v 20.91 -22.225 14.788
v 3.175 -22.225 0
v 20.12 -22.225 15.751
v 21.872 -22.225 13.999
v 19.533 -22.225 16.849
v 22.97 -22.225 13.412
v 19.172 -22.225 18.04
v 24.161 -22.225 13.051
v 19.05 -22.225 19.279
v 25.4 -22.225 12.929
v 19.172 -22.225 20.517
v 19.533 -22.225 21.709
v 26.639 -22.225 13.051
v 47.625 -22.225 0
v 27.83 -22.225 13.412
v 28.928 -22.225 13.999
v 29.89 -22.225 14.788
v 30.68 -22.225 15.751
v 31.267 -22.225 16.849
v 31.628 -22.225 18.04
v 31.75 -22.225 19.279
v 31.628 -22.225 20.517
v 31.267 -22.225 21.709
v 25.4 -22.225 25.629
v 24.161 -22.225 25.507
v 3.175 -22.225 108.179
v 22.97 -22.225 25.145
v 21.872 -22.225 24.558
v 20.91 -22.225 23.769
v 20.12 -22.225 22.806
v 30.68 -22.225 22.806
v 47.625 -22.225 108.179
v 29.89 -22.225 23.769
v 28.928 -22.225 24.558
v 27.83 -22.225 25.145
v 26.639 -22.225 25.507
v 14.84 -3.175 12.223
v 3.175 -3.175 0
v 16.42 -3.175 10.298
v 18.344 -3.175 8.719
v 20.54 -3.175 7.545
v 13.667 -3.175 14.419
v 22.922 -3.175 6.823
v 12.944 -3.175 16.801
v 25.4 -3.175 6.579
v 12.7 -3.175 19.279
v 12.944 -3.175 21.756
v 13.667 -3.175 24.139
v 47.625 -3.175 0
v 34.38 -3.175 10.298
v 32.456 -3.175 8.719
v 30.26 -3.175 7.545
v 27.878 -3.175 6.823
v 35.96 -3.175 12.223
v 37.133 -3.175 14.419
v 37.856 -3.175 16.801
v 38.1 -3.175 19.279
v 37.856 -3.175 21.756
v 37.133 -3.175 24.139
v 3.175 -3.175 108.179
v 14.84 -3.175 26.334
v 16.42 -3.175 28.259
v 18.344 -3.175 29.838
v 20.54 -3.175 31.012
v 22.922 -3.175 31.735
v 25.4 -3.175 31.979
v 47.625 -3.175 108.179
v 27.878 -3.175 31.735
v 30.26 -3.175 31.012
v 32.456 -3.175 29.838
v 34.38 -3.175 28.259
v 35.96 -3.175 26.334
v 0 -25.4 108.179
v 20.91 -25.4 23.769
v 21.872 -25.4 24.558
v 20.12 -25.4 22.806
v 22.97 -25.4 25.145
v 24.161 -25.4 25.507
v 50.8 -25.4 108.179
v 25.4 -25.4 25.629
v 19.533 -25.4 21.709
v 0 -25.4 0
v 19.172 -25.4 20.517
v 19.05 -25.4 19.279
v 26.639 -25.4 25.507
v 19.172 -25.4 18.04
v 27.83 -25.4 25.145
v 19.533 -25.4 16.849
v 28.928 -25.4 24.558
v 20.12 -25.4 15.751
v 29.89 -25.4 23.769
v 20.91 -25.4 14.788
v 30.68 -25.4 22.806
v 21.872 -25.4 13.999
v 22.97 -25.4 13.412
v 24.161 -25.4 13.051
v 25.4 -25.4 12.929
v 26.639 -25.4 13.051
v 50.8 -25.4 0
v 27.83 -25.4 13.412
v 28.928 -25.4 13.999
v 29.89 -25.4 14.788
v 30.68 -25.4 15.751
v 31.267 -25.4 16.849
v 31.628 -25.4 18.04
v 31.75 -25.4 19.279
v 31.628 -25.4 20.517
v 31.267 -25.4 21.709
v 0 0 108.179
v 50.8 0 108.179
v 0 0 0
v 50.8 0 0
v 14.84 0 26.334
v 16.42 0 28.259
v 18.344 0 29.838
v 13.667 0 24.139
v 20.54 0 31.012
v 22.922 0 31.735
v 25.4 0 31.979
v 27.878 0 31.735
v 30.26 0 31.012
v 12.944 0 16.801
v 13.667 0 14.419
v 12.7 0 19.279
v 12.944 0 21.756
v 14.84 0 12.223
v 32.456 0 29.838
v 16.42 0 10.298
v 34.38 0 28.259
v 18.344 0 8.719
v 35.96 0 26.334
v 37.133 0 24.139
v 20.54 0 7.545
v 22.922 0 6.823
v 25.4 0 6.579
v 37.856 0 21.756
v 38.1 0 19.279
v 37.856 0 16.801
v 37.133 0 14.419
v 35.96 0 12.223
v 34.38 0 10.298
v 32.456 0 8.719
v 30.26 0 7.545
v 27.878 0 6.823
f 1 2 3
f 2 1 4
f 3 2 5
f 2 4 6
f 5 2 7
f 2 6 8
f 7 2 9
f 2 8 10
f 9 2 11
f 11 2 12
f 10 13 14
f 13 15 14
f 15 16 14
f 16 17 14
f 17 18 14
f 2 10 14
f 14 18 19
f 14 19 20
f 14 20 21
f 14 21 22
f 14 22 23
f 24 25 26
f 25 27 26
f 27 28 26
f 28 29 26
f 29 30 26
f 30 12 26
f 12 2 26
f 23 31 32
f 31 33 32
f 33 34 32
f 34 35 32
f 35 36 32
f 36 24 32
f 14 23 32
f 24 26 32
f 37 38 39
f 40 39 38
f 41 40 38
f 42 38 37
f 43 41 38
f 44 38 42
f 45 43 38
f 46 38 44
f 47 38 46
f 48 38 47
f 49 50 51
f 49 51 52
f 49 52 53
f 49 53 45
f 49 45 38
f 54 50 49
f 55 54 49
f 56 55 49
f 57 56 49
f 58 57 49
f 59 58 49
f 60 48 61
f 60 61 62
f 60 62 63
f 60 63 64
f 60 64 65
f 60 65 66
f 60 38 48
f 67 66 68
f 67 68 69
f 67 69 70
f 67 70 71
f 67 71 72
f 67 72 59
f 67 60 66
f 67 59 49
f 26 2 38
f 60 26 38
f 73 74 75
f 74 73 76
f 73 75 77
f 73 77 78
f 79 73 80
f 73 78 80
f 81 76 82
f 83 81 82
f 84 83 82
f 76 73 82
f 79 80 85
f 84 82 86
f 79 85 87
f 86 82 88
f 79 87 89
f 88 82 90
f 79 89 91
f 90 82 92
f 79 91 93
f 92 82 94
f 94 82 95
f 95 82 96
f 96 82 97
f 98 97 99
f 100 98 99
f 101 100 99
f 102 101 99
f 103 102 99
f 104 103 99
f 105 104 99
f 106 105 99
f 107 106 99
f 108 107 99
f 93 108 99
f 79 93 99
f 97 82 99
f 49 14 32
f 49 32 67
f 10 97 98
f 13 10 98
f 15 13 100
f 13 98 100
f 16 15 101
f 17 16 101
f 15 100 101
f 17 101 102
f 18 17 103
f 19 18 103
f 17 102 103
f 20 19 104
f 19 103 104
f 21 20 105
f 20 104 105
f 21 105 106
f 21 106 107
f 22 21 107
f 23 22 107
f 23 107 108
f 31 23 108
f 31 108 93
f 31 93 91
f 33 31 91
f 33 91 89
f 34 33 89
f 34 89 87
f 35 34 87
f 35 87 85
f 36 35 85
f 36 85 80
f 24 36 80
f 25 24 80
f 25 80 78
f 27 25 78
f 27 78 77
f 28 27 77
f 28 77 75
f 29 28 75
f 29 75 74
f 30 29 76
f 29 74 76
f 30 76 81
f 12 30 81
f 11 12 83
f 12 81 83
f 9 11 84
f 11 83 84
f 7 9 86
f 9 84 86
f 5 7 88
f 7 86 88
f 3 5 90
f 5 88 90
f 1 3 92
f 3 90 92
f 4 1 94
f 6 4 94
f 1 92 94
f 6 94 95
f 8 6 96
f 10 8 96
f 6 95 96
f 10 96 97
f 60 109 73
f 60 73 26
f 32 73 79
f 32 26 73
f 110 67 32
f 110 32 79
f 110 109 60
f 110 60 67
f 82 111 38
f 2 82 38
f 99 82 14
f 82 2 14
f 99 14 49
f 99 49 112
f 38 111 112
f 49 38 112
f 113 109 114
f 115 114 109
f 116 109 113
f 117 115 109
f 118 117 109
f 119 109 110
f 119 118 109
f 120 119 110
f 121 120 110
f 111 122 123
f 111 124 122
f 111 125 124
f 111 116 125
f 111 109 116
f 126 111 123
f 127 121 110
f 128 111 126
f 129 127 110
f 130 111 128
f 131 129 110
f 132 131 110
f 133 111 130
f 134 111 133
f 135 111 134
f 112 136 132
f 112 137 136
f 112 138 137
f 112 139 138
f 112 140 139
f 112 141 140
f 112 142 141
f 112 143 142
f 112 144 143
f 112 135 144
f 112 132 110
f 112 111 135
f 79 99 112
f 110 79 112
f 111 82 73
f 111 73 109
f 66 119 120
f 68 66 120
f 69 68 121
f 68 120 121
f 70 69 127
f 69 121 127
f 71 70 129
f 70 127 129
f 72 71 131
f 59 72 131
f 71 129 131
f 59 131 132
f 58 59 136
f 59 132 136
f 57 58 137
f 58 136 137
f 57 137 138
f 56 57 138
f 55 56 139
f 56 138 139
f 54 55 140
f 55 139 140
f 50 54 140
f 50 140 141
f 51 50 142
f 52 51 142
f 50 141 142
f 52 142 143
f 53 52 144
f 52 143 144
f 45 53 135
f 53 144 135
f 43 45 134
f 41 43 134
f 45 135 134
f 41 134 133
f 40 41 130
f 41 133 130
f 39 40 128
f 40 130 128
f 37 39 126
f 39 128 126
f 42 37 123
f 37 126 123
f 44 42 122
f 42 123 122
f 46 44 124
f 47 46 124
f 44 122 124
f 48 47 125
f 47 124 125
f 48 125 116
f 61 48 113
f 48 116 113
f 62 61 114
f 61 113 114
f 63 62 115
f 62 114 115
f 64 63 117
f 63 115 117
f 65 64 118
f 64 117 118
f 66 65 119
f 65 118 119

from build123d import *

# Parameters (mm, degrees)
SKETCH1_W           = 50.8
SKETCH1_H           = 25.4
BOSS_EXTRUDE1_DEPTH = 108.1786
SKETCH2_W           = 44.45
SKETCH2_H           = 19.05
CUT_EXTRUDE1_DEPTH  = 123.181870578
SKETCH3_R           = 12.7
CUT_EXTRUDE2_DEPTH  = 3.175
SKETCH5_R           = 6.35
CUT_EXTRUDE3_DEPTH  = 108.1786


with BuildPart() as part:
    # Sketch1 → Boss-Extrude1 (new body)
    with BuildSketch(Plane.XY):
        with Locations((25.4, -12.7)):
            Rectangle(SKETCH1_W, SKETCH1_H)
    extrude(amount=BOSS_EXTRUDE1_DEPTH)

    # Sketch2 → Cut-Extrude1 (cut, through all)
    with BuildSketch(Plane.XY.offset(108.1786)):
        with Locations((25.4, -12.7)):
            Rectangle(SKETCH2_W, SKETCH2_H)
    extrude(amount=-CUT_EXTRUDE1_DEPTH, mode=Mode.SUBTRACT)

    # Sketch3 → Cut-Extrude2 (cut)
    with BuildSketch(Plane(origin=(0, 0, 0), x_dir=(1, 0, 0), z_dir=(0, 1, 0))):
        with Locations(Location((25.4, -19.2786, 0), (0, 0, 270))):
            Circle(SKETCH3_R)
    extrude(amount=-CUT_EXTRUDE2_DEPTH, mode=Mode.SUBTRACT)

    # Sketch5 → Cut-Extrude3 (cut)
    with BuildSketch(Plane.XZ.offset(25.4)):
        with Locations(Location((25.4, 19.2786, 0), (0, 0, 270))):
            Circle(SKETCH5_R)
    extrude(amount=-CUT_EXTRUDE3_DEPTH, mode=Mode.SUBTRACT)


solid = part.part
